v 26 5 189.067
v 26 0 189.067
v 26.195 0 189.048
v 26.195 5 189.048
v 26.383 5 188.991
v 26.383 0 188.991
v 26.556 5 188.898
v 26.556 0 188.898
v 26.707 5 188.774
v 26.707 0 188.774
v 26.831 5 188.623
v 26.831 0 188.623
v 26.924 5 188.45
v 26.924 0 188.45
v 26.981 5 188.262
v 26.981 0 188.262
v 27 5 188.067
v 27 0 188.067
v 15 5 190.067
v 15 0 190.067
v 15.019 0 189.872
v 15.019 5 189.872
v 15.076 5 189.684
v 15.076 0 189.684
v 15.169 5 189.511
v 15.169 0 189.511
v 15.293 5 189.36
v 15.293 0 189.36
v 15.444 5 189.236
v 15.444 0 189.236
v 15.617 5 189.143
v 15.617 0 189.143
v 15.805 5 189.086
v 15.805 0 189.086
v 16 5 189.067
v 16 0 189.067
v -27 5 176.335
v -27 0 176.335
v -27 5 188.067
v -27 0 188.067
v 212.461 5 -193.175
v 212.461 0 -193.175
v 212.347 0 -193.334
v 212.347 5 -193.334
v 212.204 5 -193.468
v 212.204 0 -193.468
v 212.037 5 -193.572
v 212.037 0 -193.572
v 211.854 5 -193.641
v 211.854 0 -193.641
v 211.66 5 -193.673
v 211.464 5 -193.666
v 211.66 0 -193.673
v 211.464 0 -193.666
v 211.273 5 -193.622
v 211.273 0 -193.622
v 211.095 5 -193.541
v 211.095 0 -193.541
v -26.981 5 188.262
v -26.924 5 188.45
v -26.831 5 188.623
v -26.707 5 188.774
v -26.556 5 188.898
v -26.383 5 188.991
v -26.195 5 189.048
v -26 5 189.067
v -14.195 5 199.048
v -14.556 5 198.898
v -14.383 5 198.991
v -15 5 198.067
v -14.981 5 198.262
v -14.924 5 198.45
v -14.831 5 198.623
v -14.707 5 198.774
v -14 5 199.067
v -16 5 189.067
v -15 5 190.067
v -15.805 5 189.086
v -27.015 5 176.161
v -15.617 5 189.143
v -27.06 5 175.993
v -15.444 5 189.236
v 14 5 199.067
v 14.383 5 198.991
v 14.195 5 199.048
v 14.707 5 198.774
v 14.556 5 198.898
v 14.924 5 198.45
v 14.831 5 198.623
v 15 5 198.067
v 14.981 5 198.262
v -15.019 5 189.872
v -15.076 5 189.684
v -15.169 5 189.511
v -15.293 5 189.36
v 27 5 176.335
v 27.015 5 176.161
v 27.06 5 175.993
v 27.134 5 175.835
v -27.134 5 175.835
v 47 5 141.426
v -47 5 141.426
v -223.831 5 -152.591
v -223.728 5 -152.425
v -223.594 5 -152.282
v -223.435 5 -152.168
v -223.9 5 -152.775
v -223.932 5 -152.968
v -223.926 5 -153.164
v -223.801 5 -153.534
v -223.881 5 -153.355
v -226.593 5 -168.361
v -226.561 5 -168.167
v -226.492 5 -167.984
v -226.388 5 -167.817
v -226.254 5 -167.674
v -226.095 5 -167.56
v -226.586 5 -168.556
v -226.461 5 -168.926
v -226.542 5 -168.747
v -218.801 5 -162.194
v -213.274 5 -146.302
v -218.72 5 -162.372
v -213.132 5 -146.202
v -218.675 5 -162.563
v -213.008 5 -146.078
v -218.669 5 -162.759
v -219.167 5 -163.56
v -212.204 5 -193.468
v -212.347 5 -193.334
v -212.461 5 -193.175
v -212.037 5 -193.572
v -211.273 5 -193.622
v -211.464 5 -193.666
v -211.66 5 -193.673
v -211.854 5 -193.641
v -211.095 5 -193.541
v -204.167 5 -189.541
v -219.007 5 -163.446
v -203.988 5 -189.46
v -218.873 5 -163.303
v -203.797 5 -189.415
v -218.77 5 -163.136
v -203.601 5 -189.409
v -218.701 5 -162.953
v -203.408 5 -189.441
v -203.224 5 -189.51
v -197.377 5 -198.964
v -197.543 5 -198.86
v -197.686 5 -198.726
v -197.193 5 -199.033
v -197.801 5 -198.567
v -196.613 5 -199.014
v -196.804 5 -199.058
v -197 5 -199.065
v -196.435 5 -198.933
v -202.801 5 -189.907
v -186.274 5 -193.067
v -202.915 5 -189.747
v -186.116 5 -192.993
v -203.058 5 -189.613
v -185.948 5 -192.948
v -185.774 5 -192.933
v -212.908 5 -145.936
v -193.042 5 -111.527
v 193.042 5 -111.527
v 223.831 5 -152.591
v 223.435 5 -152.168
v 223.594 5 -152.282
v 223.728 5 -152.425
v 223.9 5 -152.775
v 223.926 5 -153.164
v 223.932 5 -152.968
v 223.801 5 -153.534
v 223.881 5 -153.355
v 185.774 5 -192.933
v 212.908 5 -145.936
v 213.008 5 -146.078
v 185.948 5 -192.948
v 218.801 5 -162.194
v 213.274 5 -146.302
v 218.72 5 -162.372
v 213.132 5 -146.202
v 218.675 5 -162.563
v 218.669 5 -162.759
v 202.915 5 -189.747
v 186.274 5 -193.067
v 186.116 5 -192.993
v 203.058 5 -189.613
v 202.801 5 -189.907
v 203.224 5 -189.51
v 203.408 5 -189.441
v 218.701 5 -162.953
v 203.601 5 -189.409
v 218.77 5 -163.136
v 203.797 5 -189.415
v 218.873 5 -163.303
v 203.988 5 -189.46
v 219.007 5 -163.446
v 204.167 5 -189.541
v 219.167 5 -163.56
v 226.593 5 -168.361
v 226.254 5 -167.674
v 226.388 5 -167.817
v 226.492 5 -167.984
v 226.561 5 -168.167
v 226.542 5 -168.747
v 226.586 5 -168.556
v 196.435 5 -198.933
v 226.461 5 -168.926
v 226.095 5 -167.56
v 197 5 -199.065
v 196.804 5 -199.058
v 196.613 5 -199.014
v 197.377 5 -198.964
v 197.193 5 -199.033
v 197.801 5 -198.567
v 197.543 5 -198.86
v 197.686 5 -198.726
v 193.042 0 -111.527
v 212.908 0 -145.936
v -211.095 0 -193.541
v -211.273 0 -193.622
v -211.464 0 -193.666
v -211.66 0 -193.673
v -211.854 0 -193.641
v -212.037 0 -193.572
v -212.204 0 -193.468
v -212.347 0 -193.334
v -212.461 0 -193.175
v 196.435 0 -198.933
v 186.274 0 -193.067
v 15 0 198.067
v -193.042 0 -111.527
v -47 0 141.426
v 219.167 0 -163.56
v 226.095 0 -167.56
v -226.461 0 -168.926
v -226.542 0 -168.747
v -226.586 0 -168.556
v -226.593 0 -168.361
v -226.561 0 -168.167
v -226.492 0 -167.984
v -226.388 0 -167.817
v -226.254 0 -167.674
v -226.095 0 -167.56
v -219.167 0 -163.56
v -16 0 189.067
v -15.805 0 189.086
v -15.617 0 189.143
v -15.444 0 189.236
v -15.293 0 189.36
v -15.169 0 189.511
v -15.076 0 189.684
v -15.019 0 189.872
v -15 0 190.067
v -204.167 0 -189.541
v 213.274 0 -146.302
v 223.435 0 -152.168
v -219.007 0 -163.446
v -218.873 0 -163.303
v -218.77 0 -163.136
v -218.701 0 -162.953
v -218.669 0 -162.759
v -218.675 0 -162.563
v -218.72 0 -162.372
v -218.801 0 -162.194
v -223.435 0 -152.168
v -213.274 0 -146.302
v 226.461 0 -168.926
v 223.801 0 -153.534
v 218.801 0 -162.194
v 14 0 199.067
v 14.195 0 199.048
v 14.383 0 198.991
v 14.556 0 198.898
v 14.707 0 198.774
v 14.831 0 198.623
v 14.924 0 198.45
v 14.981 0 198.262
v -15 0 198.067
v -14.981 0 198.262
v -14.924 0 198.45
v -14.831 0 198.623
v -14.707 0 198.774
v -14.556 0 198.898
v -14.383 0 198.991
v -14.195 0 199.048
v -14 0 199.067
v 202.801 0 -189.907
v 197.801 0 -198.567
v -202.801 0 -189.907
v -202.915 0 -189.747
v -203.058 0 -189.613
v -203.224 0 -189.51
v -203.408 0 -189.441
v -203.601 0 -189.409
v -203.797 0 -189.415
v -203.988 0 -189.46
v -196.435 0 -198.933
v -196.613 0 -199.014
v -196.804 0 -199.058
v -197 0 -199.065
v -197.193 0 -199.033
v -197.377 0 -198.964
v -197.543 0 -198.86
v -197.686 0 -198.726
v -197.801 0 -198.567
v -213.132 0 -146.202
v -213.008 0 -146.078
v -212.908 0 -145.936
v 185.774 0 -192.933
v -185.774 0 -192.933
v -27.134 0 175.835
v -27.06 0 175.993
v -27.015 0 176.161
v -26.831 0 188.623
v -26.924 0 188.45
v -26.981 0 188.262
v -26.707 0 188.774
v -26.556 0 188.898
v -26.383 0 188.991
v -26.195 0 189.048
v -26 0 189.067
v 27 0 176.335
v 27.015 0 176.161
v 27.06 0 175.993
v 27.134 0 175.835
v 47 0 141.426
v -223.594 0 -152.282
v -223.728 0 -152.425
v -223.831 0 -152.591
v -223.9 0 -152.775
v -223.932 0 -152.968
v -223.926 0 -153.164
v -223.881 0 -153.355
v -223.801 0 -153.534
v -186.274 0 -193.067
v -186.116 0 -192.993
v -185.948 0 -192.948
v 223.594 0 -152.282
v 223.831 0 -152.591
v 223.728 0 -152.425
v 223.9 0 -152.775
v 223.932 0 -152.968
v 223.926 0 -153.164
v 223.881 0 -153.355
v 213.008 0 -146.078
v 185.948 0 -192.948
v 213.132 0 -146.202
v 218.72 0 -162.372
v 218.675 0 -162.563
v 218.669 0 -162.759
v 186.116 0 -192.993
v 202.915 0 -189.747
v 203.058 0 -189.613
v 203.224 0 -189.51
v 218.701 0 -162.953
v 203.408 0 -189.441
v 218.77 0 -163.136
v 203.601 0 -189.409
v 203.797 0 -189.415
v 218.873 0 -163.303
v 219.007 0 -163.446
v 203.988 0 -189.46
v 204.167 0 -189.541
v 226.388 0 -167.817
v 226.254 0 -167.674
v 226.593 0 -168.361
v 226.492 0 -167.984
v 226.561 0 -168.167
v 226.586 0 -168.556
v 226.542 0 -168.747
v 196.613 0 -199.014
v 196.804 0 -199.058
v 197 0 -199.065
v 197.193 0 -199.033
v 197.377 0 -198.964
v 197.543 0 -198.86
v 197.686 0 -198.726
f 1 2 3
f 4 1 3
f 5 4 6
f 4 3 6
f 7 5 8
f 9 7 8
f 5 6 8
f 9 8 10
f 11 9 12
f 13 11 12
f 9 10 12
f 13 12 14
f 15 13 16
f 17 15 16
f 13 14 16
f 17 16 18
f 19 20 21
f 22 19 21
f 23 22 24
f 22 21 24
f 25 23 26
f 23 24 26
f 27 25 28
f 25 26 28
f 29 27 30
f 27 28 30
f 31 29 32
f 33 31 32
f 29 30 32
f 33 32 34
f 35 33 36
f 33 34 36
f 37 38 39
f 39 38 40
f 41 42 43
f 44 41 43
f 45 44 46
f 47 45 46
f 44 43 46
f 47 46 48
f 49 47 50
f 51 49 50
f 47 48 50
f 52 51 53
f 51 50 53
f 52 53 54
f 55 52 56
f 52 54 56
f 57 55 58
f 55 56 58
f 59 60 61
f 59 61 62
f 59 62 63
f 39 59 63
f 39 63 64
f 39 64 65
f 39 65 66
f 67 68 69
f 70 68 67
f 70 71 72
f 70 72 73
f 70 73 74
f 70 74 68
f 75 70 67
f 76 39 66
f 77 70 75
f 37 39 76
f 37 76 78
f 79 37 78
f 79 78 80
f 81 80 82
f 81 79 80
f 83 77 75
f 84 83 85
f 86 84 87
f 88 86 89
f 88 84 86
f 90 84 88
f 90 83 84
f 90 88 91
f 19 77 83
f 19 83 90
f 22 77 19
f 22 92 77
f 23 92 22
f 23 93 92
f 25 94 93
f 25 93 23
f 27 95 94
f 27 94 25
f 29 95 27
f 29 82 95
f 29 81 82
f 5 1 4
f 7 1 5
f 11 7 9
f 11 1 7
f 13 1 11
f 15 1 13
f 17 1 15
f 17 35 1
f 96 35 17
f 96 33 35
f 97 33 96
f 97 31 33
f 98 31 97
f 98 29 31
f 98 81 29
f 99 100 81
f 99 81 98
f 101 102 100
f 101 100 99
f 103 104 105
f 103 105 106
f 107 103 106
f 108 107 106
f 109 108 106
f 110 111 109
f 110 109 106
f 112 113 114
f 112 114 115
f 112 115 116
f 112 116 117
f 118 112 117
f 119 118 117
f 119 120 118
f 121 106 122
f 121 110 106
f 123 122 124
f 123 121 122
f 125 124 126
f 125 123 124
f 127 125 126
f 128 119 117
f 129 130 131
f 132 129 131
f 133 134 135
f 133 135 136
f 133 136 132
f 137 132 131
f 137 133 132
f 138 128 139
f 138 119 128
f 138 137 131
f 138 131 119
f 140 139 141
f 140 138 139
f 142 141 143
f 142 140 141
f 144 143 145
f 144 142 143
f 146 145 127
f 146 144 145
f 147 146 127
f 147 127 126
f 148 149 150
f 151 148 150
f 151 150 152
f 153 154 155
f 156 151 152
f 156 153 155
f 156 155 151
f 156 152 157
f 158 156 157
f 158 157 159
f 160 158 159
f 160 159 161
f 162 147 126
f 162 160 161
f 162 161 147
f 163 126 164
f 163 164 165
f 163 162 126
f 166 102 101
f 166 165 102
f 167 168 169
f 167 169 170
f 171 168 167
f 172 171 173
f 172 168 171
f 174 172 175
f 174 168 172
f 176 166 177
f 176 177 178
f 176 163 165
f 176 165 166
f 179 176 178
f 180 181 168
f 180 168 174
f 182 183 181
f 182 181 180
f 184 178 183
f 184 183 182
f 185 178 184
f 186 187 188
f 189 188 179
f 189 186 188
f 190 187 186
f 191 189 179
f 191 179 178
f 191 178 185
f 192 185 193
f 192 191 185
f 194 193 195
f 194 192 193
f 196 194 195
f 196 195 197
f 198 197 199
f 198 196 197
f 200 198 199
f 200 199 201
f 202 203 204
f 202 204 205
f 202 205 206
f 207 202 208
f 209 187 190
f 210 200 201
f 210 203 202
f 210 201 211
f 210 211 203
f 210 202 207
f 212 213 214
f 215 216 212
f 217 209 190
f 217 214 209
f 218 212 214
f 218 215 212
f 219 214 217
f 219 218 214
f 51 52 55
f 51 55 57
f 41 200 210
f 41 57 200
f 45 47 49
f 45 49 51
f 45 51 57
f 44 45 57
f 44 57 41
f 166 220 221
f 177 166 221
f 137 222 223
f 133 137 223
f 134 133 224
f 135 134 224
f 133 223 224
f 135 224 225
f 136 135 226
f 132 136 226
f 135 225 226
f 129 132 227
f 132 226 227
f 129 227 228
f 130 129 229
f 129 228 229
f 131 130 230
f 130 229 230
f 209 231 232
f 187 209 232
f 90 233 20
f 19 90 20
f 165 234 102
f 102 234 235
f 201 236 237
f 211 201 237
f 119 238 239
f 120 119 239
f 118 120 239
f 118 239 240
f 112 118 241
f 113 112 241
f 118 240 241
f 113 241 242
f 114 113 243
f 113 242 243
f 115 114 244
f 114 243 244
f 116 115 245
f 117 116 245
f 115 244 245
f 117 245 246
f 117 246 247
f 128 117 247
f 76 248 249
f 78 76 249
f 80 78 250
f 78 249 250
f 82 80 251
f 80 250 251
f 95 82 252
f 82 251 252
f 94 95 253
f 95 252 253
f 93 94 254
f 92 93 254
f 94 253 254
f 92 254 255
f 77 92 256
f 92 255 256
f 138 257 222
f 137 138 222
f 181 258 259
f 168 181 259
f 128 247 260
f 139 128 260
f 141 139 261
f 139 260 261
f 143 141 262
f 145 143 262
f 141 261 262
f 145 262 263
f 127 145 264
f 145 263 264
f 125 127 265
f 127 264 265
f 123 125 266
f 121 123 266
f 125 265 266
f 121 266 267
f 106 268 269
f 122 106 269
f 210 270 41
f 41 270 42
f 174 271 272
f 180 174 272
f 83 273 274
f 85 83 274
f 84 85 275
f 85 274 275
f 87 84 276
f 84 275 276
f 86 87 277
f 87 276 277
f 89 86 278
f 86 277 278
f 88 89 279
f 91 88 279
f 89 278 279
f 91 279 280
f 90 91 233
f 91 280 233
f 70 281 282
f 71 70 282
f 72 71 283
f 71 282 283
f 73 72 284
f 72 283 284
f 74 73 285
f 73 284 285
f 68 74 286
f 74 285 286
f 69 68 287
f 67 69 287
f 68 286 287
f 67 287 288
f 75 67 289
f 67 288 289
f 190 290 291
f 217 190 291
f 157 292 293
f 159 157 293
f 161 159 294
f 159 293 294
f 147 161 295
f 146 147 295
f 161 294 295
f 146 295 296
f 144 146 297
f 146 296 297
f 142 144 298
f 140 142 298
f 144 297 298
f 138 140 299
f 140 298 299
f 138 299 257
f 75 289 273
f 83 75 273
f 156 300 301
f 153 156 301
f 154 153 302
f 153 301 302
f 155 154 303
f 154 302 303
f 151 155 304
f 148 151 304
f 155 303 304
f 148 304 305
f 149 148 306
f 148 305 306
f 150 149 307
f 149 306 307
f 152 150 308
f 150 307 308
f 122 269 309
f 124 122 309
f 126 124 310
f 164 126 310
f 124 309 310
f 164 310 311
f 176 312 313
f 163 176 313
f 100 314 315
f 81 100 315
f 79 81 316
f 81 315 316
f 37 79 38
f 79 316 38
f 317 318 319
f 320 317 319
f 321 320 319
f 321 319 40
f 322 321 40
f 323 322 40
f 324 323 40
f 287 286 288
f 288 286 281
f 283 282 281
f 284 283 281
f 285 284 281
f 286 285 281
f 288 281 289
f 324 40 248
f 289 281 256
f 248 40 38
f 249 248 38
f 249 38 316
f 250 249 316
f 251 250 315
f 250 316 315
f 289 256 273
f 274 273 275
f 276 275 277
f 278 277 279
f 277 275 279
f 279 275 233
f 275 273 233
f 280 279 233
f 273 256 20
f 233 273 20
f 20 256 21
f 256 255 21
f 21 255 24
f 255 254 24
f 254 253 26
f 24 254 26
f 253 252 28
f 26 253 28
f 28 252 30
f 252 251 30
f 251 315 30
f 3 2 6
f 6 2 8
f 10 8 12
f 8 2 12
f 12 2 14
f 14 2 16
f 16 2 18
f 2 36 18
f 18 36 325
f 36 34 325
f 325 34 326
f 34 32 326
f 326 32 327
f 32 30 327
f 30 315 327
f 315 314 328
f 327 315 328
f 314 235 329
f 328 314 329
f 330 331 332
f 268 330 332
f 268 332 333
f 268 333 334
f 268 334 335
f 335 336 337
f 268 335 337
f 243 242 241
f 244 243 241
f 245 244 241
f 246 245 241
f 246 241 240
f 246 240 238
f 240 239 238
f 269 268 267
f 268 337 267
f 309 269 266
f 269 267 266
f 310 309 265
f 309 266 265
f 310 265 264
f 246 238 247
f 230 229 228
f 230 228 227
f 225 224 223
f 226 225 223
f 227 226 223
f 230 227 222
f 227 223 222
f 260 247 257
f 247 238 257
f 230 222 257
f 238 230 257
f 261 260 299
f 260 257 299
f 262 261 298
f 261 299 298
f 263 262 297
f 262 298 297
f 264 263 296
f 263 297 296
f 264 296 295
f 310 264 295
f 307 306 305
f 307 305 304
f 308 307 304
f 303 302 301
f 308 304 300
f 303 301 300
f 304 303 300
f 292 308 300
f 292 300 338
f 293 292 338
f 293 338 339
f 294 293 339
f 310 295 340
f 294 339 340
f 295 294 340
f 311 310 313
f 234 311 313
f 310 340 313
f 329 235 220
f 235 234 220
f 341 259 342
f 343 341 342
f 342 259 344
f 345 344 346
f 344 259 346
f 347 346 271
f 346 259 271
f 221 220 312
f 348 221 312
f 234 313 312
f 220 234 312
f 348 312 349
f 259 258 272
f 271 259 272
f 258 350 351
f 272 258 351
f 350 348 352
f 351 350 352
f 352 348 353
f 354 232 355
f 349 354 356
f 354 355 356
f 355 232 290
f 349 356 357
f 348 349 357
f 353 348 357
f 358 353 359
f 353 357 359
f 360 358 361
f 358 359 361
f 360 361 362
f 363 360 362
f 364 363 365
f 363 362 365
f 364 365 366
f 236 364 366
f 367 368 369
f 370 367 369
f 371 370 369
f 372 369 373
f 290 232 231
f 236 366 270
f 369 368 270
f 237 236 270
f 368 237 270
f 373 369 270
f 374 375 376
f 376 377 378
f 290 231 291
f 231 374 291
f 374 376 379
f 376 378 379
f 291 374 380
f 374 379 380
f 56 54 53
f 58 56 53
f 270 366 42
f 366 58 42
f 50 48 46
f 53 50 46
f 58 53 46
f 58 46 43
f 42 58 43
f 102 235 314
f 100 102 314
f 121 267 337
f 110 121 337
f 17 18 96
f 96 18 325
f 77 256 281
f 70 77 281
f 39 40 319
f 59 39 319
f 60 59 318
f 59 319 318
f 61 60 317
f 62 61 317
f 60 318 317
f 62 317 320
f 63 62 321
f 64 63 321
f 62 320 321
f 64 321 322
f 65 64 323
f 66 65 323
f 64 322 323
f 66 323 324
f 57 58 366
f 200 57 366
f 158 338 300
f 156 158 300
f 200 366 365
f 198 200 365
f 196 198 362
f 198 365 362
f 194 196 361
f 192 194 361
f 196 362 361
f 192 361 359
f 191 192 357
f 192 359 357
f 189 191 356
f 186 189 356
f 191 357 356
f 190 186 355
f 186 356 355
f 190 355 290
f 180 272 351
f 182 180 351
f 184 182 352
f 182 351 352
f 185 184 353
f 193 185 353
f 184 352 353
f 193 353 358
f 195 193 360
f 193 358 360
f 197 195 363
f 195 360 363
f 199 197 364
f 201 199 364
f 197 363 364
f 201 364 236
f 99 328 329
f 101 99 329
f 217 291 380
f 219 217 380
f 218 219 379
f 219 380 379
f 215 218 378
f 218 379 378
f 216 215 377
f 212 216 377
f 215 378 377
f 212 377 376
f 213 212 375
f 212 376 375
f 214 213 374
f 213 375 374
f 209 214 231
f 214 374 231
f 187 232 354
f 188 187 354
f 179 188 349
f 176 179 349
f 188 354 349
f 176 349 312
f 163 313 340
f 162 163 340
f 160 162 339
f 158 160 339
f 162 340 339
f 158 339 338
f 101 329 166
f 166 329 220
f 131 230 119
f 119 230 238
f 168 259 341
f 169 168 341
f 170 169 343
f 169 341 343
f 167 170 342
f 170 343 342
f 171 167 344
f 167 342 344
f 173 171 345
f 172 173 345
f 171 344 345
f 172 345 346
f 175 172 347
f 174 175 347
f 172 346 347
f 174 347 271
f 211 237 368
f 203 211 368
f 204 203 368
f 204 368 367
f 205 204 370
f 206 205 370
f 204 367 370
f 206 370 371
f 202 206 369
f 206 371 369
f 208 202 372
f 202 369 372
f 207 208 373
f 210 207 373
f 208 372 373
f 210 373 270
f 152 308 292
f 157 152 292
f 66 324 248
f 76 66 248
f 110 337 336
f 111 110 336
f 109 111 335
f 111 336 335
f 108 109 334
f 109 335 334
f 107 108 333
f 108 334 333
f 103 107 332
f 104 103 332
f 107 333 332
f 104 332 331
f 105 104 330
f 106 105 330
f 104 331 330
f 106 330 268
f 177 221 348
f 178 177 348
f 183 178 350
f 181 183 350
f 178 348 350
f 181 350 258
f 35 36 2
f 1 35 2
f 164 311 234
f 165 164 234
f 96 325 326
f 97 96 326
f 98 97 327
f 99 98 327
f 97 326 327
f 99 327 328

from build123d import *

# Parameters (mm, degrees)
EXTRUDE_1_DEPTH = 5


with BuildPart() as part:
    # 草圖1 → 填料-伸長1 (new body)
    with BuildSketch(Plane(origin=(0, 0, 0), x_dir=(1, 0, 0), z_dir=(0, 1, 0))):
        with BuildLine():
            Line((27.133974596, -175.834936491), (47, -141.425971147))
            Line((47, -141.425971147), (193.042249331, 111.526624746))
            Line((193.042249331, 111.526624746), (212.908274735, 145.93559009))
            ThreePointArc((212.908274735, 145.93559009), (213.067193357, 146.142696871), (213.274300139, 146.301615494))
            Line((213.274300139, 146.301615494), (223.434554176, 152.167640898))
            ThreePointArc((223.434554176, 152.167640898), (223.900480003, 152.774847256), (223.80057958, 153.533666301))
            Line((223.80057958, 153.533666301), (218.80057958, 162.193920339))
            ThreePointArc((218.80057958, 162.193920339), (218.700679158, 162.952739384), (219.166604984, 163.559945743))
            Line((219.166604984, 163.559945743), (226.094808214, 167.559945743))
            ThreePointArc((226.094808214, 167.559945743), (226.560734041, 168.167152102), (226.460833618, 168.925971147))
            Line((226.460833618, 168.925971147), (212.460833618, 193.174682453))
            ThreePointArc((212.460833618, 193.174682453), (211.853627259, 193.640608279), (211.094808214, 193.540707856))
            Line((211.094808214, 193.540707856), (204.166604984, 189.540707856))
            ThreePointArc((204.166604984, 189.540707856), (203.407785939, 189.440807434), (202.80057958, 189.90673326))
            Line((202.80057958, 189.90673326), (197.80057958, 198.566987298))
            ThreePointArc((197.80057958, 198.566987298), (197.193373221, 199.032913124), (196.434554176, 198.933012702))
            Line((196.434554176, 198.933012702), (186.274300139, 193.066987298))
            ThreePointArc((186.274300139, 193.066987298), (186.033119184, 192.967086876), (185.774300139, 192.933012702))
            Line((185.774300139, 192.933012702), (146.042249331, 192.933012702))
            Line((146.042249331, 192.933012702), (-146.042249331, 192.933012702))
            Line((-146.042249331, 192.933012702), (-185.774300139, 192.933012702))
            ThreePointArc((-185.774300139, 192.933012702), (-186.033119184, 192.967086876), (-186.274300139, 193.066987298))
            Line((-186.274300139, 193.066987298), (-196.434554176, 198.933012702))
            ThreePointArc((-196.434554176, 198.933012702), (-197.193373221, 199.032913124), (-197.80057958, 198.566987298))
            Line((-197.80057958, 198.566987298), (-202.80057958, 189.90673326))
            ThreePointArc((-202.80057958, 189.90673326), (-203.407785939, 189.440807434), (-204.166604984, 189.540707856))
            Line((-204.166604984, 189.540707856), (-211.094808214, 193.540707856))
            ThreePointArc((-211.094808214, 193.540707856), (-211.853627259, 193.640608279), (-212.460833618, 193.174682453))
            Line((-212.460833618, 193.174682453), (-226.460833618, 168.925971147))
            ThreePointArc((-226.460833618, 168.925971147), (-226.560734041, 168.167152102), (-226.094808214, 167.559945743))
            Line((-226.094808214, 167.559945743), (-219.166604984, 163.559945743))
            ThreePointArc((-219.166604984, 163.559945743), (-218.700679158, 162.952739384), (-218.80057958, 162.193920339))
            Line((-218.80057958, 162.193920339), (-223.80057958, 153.533666301))
            ThreePointArc((-223.80057958, 153.533666301), (-223.900480003, 152.774847256), (-223.434554176, 152.167640898))
            Line((-223.434554176, 152.167640898), (-213.274300139, 146.301615494))
            ThreePointArc((-213.274300139, 146.301615494), (-213.067193357, 146.142696871), (-212.908274735, 145.93559009))
            Line((-212.908274735, 145.93559009), (-193.042249331, 111.526624746))
            Line((-193.042249331, 111.526624746), (-47, -141.425971147))
            Line((-47, -141.425971147), (-27.133974596, -175.834936491))
            ThreePointArc((-27.133974596, -175.834936491), (-27.034074174, -176.076117445), (-27, -176.334936491))
            Line((-27, -176.334936491), (-27, -188.066987298))
            ThreePointArc((-27, -188.066987298), (-26.707106781, -188.774094079), (-26, -189.066987298))
            Line((-26, -189.066987298), (-16, -189.066987298))
            ThreePointArc((-16, -189.066987298), (-15.292893219, -189.359880517), (-15, -190.066987298))
            Line((-15, -190.066987298), (-15, -198.066987298))
            ThreePointArc((-15, -198.066987298), (-14.707106781, -198.774094079), (-14, -199.066987298))
            Line((-14, -199.066987298), (14, -199.066987298))
            ThreePointArc((14, -199.066987298), (14.707106781, -198.774094079), (15, -198.066987298))
            Line((15, -198.066987298), (15, -190.066987298))
            ThreePointArc((15, -190.066987298), (15.292893219, -189.359880517), (16, -189.066987298))
            Line((16, -189.066987298), (26, -189.066987298))
            ThreePointArc((26, -189.066987298), (26.707106781, -188.774094079), (27, -188.066987298))
            Line((27, -188.066987298), (27, -176.334936491))
            ThreePointArc((27, -176.334936491), (27.034074174, -176.076117445), (27.133974596, -175.834936491))
        make_face()
    extrude(amount=EXTRUDE_1_DEPTH)


solid = part.part
